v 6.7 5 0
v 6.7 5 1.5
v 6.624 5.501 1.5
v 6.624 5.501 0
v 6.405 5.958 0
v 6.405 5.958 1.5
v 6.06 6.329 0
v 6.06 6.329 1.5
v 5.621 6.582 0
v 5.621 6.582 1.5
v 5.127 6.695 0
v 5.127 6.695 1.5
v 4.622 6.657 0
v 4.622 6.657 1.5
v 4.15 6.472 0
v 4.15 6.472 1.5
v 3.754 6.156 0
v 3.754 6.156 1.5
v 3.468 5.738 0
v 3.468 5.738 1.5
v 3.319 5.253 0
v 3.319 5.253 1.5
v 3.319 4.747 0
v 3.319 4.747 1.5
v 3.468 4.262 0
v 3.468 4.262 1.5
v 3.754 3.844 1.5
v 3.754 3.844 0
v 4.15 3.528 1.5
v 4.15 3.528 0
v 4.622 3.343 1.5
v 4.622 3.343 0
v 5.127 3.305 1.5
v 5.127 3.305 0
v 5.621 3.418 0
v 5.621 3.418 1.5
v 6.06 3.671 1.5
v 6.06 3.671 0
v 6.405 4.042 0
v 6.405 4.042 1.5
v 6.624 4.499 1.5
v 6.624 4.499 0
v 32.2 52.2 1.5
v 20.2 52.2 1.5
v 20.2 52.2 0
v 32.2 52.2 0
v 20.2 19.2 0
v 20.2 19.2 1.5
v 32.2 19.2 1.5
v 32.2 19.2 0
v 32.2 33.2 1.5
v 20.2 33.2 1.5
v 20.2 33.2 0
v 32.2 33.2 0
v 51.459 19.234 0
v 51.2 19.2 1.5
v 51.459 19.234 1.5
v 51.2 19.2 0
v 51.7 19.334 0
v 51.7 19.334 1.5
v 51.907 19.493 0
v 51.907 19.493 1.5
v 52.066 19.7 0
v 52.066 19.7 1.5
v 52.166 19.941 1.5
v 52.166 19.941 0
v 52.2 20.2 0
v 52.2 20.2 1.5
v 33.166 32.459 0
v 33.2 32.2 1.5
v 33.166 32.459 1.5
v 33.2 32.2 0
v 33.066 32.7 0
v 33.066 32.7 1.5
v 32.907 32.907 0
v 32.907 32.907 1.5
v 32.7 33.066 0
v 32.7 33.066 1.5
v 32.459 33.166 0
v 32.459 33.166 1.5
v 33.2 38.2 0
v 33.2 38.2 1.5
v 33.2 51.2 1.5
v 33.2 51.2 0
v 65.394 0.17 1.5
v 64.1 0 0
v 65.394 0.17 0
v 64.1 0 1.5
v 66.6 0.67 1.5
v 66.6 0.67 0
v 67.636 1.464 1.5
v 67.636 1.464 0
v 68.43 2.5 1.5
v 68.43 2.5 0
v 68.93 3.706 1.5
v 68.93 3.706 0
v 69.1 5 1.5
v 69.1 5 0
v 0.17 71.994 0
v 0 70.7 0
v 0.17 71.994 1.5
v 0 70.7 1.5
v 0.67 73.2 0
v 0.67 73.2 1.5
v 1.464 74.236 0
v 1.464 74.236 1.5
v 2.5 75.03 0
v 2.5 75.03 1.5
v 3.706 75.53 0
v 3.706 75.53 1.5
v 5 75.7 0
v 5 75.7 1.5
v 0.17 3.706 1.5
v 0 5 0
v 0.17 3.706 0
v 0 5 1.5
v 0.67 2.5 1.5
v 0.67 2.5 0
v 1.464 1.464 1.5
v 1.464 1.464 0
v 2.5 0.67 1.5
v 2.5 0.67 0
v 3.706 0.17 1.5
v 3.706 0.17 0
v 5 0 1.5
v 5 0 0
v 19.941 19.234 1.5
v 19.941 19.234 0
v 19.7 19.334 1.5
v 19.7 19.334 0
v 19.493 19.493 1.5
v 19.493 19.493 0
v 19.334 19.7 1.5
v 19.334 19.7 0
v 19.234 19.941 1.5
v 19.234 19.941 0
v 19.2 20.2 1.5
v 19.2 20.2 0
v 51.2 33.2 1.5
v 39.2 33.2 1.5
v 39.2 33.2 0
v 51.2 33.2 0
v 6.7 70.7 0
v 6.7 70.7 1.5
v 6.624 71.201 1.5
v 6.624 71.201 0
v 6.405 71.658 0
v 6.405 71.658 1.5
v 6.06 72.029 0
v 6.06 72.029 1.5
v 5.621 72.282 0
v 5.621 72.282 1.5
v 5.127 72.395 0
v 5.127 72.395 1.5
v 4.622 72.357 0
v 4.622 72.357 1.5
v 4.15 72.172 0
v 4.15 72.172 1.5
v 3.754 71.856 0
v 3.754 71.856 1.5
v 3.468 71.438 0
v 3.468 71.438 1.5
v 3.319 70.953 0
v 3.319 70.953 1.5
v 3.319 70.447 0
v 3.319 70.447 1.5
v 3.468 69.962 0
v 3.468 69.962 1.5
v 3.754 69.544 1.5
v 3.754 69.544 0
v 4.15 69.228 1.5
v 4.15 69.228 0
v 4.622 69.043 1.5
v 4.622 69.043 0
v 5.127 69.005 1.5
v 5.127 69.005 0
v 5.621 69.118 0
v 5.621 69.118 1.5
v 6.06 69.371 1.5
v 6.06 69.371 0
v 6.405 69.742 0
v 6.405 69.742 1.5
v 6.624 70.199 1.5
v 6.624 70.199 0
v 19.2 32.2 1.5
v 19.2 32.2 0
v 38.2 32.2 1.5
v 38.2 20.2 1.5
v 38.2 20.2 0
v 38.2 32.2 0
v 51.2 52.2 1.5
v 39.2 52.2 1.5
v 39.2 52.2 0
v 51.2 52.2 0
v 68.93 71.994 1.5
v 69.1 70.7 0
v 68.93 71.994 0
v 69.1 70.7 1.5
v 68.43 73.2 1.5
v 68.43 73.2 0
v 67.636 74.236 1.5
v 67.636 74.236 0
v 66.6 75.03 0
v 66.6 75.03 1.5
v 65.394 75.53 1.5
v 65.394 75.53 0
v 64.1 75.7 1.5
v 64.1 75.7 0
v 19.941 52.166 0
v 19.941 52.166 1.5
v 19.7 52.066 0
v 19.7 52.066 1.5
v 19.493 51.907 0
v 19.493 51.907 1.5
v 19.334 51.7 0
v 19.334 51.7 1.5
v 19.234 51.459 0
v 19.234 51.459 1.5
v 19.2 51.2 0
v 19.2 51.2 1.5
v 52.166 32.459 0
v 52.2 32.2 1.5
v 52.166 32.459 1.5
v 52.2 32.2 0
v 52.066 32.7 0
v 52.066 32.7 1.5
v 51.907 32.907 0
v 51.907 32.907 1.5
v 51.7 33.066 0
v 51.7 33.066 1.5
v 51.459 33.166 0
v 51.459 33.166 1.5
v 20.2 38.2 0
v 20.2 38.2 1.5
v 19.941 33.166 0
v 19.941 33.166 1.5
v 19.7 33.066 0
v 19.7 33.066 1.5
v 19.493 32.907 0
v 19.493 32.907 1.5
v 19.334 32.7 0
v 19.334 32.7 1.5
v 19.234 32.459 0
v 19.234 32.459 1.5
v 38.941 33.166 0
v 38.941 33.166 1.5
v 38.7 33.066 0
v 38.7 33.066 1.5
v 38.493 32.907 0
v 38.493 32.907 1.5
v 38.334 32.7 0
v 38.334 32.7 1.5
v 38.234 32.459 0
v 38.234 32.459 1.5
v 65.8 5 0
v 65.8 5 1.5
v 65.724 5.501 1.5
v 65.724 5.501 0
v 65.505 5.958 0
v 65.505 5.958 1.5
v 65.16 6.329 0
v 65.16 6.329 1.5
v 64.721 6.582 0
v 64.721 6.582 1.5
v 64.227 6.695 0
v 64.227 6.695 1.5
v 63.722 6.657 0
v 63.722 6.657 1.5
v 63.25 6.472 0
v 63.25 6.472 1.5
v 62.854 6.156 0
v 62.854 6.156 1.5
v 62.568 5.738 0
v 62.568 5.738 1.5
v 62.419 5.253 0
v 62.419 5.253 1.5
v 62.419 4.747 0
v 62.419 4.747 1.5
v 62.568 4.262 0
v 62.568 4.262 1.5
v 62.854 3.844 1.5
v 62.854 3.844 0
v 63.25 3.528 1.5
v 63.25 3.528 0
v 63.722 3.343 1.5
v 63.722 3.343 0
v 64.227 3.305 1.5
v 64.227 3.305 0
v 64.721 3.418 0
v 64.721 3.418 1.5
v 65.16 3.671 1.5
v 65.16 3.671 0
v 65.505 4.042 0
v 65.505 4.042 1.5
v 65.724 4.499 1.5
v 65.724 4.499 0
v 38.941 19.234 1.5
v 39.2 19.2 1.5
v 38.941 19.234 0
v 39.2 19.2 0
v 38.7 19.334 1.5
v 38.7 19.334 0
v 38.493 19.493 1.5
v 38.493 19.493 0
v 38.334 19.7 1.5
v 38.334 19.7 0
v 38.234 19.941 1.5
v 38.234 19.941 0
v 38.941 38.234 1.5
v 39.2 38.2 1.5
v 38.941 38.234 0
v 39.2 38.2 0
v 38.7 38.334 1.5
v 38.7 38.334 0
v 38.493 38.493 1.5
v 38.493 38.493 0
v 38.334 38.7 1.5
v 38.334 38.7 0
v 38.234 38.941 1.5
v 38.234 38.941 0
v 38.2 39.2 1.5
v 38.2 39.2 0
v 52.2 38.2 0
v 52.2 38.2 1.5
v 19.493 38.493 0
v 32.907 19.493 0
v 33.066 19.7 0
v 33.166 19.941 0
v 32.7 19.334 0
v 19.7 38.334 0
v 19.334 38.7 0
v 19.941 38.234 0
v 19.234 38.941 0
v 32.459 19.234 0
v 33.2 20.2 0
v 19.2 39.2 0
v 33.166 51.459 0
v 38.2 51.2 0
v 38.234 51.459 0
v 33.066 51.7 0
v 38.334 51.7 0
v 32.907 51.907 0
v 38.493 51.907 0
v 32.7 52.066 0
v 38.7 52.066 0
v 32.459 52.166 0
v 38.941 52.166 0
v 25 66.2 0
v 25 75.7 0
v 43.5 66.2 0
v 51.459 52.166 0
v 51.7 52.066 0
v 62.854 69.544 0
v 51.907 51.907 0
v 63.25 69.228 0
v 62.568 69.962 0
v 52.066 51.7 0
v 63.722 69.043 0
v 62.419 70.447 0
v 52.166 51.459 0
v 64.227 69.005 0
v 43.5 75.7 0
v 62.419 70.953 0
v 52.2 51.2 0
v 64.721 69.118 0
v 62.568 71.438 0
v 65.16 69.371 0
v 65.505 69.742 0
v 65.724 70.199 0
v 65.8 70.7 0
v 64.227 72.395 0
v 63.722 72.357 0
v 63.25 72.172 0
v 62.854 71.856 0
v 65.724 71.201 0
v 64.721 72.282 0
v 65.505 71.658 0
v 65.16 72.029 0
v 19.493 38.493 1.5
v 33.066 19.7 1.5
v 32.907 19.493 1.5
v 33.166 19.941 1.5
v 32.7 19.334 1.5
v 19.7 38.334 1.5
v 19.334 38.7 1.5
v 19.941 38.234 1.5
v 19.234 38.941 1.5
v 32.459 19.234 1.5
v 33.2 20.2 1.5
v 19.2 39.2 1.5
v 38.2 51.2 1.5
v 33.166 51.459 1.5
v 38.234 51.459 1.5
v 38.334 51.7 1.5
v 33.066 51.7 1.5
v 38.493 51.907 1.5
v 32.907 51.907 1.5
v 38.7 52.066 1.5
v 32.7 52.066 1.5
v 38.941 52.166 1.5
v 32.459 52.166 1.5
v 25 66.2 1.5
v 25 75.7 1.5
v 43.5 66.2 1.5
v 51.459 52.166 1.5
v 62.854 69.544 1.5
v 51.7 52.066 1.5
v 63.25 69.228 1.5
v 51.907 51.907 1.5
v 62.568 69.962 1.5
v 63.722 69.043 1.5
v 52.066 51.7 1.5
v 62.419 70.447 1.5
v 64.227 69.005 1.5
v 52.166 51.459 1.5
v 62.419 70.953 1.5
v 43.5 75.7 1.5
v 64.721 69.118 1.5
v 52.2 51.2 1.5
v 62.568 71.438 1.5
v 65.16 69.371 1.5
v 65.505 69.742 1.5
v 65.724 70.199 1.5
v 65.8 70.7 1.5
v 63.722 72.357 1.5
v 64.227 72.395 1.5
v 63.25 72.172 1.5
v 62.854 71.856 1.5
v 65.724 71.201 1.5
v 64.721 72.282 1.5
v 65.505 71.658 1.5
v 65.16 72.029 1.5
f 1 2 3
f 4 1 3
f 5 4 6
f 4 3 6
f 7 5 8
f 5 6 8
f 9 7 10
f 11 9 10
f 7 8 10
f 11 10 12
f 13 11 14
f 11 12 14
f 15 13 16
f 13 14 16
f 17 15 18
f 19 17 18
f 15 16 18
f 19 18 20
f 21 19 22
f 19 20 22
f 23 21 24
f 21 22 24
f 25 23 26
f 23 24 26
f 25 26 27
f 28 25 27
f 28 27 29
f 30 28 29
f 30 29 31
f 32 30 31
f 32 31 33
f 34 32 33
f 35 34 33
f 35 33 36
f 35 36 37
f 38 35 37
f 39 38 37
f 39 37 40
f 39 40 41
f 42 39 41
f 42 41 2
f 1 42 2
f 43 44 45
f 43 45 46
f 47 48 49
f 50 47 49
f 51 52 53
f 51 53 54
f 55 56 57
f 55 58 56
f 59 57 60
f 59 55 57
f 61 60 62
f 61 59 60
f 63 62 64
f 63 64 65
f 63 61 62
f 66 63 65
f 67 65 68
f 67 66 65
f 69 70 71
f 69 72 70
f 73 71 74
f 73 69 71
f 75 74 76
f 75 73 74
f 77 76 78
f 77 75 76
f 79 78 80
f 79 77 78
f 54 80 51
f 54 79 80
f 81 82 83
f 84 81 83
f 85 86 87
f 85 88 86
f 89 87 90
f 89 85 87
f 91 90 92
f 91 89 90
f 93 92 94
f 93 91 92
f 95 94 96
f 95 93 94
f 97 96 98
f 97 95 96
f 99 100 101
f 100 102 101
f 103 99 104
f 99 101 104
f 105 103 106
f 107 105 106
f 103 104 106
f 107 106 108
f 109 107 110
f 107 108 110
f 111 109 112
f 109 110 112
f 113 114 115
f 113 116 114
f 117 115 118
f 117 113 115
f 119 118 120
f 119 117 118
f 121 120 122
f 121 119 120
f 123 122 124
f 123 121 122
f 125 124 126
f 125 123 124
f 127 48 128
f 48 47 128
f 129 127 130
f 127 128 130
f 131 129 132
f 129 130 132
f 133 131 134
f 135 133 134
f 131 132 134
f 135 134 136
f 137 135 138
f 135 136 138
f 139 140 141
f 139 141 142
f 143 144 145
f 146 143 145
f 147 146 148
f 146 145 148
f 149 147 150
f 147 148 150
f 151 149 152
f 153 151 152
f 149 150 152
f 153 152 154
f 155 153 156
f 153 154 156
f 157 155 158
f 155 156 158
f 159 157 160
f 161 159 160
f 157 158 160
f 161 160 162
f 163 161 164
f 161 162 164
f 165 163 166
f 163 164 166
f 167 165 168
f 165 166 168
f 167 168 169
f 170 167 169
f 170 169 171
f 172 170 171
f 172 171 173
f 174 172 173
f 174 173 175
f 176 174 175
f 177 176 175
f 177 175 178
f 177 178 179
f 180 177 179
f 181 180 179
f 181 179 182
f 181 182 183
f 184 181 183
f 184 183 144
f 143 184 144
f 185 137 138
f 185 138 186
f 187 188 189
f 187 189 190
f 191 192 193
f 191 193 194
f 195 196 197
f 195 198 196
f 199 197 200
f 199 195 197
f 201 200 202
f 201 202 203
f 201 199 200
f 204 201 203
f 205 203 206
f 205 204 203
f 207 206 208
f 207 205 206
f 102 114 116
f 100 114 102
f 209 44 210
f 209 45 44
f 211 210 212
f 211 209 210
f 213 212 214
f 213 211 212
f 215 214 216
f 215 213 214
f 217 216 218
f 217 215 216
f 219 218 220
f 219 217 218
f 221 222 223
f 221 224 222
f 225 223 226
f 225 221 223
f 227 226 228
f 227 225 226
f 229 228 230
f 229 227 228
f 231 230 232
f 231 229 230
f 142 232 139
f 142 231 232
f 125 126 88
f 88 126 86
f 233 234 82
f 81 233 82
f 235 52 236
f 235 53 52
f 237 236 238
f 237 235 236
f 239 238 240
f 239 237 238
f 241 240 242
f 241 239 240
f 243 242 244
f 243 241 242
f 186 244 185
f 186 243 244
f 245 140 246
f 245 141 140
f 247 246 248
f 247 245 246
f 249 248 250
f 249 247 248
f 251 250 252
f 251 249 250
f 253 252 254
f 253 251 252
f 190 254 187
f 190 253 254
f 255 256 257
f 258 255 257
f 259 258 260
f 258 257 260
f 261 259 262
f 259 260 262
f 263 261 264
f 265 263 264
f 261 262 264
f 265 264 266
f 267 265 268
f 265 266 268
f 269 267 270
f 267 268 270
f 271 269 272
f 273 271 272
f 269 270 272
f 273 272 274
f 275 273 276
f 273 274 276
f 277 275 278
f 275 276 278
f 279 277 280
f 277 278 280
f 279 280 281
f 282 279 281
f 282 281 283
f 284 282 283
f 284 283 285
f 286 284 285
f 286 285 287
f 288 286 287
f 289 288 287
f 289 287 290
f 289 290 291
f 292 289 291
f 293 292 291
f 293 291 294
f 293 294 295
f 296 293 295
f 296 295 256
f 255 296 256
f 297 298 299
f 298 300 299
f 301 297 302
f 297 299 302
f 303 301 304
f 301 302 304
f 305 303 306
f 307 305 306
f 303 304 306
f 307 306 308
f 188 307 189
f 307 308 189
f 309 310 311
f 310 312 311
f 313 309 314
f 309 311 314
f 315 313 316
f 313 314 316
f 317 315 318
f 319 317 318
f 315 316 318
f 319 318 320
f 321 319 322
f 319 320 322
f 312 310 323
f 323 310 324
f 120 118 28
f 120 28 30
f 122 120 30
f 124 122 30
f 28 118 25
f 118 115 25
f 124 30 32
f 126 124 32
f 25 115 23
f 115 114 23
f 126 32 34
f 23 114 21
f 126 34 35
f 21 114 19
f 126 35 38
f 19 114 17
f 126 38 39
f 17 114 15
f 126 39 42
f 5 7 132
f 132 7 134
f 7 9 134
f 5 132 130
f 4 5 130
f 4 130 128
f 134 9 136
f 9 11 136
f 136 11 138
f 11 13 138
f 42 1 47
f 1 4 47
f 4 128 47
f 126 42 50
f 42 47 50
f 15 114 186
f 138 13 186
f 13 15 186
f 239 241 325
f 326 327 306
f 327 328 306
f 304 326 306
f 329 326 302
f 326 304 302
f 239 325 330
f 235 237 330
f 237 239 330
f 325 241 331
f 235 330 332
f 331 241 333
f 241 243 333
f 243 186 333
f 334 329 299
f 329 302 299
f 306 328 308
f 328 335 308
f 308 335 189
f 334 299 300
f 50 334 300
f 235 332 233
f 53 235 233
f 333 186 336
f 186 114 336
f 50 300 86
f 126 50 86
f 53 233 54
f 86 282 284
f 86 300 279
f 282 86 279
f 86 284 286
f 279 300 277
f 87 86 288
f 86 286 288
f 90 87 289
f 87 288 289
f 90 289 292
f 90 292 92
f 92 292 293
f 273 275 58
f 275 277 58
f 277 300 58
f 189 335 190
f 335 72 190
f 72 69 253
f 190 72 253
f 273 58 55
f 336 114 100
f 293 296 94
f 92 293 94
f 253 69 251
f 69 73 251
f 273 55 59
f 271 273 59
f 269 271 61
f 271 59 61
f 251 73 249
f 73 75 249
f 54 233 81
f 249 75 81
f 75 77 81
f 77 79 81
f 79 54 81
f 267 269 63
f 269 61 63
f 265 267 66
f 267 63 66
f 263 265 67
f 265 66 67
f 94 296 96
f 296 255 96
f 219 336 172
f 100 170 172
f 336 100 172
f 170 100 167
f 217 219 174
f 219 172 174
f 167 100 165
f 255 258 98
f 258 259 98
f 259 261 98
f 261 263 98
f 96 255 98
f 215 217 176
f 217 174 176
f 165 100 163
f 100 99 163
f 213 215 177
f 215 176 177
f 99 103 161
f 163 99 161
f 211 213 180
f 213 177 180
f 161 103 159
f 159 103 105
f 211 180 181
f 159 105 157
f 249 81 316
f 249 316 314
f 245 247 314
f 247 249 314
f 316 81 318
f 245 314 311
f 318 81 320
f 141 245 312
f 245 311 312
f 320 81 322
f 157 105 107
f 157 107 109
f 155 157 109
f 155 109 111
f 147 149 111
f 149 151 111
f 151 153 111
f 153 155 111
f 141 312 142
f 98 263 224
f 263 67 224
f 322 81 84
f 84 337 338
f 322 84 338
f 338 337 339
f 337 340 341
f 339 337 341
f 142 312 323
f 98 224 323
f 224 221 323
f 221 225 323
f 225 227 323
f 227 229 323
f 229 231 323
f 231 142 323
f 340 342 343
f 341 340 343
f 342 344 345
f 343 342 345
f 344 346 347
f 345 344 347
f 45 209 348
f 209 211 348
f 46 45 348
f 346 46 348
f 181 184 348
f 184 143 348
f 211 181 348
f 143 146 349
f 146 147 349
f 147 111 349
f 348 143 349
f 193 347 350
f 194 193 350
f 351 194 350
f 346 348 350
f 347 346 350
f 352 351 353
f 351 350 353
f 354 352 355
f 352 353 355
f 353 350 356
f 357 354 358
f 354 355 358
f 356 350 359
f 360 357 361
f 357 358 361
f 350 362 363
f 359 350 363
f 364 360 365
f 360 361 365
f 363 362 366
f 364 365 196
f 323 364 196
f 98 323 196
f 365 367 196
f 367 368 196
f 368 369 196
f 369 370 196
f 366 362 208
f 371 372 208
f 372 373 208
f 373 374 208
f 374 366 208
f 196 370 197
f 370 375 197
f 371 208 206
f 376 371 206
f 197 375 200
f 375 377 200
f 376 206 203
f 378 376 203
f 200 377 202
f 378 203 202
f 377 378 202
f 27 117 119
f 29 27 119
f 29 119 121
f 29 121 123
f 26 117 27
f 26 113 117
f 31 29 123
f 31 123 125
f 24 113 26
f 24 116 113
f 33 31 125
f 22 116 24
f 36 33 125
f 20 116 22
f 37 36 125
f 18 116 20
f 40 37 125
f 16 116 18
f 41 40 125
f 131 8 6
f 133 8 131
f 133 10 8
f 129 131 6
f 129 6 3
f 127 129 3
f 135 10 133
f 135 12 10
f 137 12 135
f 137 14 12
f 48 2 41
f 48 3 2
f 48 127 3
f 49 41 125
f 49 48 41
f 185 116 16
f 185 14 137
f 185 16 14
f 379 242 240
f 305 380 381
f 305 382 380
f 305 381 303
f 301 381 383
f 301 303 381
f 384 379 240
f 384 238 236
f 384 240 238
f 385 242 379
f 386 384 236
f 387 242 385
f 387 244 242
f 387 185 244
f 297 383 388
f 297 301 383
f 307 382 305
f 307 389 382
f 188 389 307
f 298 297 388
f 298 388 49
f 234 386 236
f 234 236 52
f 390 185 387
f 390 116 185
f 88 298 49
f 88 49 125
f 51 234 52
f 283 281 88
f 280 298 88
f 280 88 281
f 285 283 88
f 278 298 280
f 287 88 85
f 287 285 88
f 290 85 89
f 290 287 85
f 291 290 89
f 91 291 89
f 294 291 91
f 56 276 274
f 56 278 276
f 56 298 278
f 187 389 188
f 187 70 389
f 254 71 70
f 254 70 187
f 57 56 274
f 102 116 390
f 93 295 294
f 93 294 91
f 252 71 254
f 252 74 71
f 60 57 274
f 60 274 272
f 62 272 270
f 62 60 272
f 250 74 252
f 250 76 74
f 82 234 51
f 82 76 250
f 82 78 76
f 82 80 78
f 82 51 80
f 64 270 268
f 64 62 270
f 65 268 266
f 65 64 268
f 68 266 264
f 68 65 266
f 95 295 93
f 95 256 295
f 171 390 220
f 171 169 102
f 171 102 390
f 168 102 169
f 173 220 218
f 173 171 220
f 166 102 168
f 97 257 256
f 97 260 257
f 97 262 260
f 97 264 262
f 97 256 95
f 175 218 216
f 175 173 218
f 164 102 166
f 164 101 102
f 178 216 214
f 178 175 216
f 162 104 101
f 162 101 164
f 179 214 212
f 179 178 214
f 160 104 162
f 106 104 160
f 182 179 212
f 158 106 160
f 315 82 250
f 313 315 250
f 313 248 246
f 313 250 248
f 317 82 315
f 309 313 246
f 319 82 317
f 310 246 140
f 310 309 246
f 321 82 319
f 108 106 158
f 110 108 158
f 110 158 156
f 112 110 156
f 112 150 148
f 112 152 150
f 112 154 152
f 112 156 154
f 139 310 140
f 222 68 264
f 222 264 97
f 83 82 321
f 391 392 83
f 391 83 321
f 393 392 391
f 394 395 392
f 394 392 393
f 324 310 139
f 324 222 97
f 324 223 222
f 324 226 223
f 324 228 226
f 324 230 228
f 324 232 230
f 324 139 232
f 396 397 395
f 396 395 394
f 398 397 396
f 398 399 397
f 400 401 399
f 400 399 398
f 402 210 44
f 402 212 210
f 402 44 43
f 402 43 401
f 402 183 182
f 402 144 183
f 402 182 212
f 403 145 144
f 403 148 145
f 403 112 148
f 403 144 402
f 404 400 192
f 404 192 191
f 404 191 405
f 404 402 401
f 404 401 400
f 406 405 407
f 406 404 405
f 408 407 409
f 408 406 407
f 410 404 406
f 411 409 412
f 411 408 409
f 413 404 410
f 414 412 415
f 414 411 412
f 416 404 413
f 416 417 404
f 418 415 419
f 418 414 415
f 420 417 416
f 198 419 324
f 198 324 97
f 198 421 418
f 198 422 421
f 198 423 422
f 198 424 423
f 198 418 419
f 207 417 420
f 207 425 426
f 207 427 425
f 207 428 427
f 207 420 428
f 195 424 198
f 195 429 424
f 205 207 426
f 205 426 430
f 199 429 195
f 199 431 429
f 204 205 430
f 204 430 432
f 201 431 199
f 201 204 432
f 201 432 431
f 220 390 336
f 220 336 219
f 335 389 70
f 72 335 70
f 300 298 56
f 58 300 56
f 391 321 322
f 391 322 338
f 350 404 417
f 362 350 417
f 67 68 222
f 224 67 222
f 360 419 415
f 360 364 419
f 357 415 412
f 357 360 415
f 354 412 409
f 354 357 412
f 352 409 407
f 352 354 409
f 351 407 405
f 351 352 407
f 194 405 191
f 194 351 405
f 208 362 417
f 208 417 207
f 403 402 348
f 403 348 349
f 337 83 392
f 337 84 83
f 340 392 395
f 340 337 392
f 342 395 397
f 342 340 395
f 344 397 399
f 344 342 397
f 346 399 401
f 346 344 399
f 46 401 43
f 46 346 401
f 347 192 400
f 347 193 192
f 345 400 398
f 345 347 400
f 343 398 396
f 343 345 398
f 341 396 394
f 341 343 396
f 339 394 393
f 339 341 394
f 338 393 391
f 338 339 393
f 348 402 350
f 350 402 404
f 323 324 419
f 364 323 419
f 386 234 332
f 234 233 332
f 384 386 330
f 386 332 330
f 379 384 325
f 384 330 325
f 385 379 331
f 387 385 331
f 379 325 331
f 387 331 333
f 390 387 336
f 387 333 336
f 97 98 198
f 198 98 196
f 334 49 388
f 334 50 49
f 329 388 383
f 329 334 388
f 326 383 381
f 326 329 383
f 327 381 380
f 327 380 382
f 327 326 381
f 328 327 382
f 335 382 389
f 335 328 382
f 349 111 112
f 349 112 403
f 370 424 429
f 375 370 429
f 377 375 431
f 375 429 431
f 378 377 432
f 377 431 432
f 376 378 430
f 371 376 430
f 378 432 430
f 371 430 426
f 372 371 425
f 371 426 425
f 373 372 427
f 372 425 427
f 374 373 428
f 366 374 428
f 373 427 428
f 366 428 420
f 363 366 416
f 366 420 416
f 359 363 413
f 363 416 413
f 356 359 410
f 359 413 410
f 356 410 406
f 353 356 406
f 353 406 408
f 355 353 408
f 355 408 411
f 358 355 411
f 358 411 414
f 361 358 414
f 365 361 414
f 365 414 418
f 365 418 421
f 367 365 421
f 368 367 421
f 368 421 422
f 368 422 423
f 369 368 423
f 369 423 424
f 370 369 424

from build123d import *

# Parameters (mm, degrees)
SKETCH_W      = 69.1
SKETCH_H      = 75.7
PAD_DEPTH     = 1.5
FILLET_R      = 5
SKETCH001_R   = 1.7
HOLE_DEPTH    = 25
SKETCH002_W   = 14
SKETCH002_H   = 14
SKETCH002_W_2 = 18.5
SKETCH002_H_2 = 9.5
POCKET_DEPTH  = 5
FILLET001_R   = 1


with BuildPart() as part:
    # Sketch → Pad (new body)
    with BuildSketch(Plane.XY):
        with Locations((34.55, 37.85)):
            Rectangle(SKETCH_W, SKETCH_H)
    extrude(amount=PAD_DEPTH)

    # Fillet
    fillet_edges = [part.edges().sort_by_distance(p)[0] for p in [
        (0, 0, 0.75),
        (69.1, 0, 0.75),
        (69.1, 75.7, 0.75),
        (0, 75.7, 0.75),
    ]]
    fillet(fillet_edges, radius=FILLET_R)

    # Sketch001 (on Face5 of Fillet) → Hole (cut)
    with BuildSketch(Plane.XY.offset(1.5)):
        with Locations((5, 5)):
            Circle(SKETCH001_R)
        with Locations((64.1, 5)):
            Circle(SKETCH001_R)
        with Locations((5, 70.7)):
            Circle(SKETCH001_R)
        with Locations((64.1, 70.7)):
            Circle(SKETCH001_R)
    extrude(amount=-HOLE_DEPTH, mode=Mode.SUBTRACT)

    # Sketch002 (on Face5 of Hole) → Pocket (cut)
    with BuildSketch(Plane.XY.offset(1.5)):
        with Locations((26.2, 26.2)):
            Rectangle(SKETCH002_W, SKETCH002_H)
        with Locations((45.2, 26.2)):
            Rectangle(SKETCH002_W, SKETCH002_H)
        with Locations((26.2, 45.2)):
            Rectangle(SKETCH002_W, SKETCH002_H)
        with Locations((45.2, 45.2)):
            Rectangle(SKETCH002_W, SKETCH002_H)
        with Locations((34.25, 70.95)):
            Rectangle(SKETCH002_W_2, SKETCH002_H_2)
    extrude(amount=-POCKET_DEPTH, mode=Mode.SUBTRACT)

    # Fillet001
    fillet001_edges = [part.edges().sort_by_distance(p)[0] for p in [
        (19.2, 52.2, 0.75),
        (38.2, 52.2, 0.75),
        (38.2, 33.2, 0.75),
        (19.2, 33.2, 0.75),
        (38.2, 38.2, 0.75),
        (38.2, 19.2, 0.75),
        (19.2, 19.2, 0.75),
        (52.2, 19.2, 0.75),
        (33.2, 19.2, 0.75),
        (19.2, 38.2, 0.75),
        (52.2, 52.2, 0.75),
        (52.2, 33.2, 0.75),
        (33.2, 33.2, 0.75),
        (33.2, 52.2, 0.75),
    ]]
    fillet(fillet001_edges, radius=FILLET001_R)


solid = part.part
